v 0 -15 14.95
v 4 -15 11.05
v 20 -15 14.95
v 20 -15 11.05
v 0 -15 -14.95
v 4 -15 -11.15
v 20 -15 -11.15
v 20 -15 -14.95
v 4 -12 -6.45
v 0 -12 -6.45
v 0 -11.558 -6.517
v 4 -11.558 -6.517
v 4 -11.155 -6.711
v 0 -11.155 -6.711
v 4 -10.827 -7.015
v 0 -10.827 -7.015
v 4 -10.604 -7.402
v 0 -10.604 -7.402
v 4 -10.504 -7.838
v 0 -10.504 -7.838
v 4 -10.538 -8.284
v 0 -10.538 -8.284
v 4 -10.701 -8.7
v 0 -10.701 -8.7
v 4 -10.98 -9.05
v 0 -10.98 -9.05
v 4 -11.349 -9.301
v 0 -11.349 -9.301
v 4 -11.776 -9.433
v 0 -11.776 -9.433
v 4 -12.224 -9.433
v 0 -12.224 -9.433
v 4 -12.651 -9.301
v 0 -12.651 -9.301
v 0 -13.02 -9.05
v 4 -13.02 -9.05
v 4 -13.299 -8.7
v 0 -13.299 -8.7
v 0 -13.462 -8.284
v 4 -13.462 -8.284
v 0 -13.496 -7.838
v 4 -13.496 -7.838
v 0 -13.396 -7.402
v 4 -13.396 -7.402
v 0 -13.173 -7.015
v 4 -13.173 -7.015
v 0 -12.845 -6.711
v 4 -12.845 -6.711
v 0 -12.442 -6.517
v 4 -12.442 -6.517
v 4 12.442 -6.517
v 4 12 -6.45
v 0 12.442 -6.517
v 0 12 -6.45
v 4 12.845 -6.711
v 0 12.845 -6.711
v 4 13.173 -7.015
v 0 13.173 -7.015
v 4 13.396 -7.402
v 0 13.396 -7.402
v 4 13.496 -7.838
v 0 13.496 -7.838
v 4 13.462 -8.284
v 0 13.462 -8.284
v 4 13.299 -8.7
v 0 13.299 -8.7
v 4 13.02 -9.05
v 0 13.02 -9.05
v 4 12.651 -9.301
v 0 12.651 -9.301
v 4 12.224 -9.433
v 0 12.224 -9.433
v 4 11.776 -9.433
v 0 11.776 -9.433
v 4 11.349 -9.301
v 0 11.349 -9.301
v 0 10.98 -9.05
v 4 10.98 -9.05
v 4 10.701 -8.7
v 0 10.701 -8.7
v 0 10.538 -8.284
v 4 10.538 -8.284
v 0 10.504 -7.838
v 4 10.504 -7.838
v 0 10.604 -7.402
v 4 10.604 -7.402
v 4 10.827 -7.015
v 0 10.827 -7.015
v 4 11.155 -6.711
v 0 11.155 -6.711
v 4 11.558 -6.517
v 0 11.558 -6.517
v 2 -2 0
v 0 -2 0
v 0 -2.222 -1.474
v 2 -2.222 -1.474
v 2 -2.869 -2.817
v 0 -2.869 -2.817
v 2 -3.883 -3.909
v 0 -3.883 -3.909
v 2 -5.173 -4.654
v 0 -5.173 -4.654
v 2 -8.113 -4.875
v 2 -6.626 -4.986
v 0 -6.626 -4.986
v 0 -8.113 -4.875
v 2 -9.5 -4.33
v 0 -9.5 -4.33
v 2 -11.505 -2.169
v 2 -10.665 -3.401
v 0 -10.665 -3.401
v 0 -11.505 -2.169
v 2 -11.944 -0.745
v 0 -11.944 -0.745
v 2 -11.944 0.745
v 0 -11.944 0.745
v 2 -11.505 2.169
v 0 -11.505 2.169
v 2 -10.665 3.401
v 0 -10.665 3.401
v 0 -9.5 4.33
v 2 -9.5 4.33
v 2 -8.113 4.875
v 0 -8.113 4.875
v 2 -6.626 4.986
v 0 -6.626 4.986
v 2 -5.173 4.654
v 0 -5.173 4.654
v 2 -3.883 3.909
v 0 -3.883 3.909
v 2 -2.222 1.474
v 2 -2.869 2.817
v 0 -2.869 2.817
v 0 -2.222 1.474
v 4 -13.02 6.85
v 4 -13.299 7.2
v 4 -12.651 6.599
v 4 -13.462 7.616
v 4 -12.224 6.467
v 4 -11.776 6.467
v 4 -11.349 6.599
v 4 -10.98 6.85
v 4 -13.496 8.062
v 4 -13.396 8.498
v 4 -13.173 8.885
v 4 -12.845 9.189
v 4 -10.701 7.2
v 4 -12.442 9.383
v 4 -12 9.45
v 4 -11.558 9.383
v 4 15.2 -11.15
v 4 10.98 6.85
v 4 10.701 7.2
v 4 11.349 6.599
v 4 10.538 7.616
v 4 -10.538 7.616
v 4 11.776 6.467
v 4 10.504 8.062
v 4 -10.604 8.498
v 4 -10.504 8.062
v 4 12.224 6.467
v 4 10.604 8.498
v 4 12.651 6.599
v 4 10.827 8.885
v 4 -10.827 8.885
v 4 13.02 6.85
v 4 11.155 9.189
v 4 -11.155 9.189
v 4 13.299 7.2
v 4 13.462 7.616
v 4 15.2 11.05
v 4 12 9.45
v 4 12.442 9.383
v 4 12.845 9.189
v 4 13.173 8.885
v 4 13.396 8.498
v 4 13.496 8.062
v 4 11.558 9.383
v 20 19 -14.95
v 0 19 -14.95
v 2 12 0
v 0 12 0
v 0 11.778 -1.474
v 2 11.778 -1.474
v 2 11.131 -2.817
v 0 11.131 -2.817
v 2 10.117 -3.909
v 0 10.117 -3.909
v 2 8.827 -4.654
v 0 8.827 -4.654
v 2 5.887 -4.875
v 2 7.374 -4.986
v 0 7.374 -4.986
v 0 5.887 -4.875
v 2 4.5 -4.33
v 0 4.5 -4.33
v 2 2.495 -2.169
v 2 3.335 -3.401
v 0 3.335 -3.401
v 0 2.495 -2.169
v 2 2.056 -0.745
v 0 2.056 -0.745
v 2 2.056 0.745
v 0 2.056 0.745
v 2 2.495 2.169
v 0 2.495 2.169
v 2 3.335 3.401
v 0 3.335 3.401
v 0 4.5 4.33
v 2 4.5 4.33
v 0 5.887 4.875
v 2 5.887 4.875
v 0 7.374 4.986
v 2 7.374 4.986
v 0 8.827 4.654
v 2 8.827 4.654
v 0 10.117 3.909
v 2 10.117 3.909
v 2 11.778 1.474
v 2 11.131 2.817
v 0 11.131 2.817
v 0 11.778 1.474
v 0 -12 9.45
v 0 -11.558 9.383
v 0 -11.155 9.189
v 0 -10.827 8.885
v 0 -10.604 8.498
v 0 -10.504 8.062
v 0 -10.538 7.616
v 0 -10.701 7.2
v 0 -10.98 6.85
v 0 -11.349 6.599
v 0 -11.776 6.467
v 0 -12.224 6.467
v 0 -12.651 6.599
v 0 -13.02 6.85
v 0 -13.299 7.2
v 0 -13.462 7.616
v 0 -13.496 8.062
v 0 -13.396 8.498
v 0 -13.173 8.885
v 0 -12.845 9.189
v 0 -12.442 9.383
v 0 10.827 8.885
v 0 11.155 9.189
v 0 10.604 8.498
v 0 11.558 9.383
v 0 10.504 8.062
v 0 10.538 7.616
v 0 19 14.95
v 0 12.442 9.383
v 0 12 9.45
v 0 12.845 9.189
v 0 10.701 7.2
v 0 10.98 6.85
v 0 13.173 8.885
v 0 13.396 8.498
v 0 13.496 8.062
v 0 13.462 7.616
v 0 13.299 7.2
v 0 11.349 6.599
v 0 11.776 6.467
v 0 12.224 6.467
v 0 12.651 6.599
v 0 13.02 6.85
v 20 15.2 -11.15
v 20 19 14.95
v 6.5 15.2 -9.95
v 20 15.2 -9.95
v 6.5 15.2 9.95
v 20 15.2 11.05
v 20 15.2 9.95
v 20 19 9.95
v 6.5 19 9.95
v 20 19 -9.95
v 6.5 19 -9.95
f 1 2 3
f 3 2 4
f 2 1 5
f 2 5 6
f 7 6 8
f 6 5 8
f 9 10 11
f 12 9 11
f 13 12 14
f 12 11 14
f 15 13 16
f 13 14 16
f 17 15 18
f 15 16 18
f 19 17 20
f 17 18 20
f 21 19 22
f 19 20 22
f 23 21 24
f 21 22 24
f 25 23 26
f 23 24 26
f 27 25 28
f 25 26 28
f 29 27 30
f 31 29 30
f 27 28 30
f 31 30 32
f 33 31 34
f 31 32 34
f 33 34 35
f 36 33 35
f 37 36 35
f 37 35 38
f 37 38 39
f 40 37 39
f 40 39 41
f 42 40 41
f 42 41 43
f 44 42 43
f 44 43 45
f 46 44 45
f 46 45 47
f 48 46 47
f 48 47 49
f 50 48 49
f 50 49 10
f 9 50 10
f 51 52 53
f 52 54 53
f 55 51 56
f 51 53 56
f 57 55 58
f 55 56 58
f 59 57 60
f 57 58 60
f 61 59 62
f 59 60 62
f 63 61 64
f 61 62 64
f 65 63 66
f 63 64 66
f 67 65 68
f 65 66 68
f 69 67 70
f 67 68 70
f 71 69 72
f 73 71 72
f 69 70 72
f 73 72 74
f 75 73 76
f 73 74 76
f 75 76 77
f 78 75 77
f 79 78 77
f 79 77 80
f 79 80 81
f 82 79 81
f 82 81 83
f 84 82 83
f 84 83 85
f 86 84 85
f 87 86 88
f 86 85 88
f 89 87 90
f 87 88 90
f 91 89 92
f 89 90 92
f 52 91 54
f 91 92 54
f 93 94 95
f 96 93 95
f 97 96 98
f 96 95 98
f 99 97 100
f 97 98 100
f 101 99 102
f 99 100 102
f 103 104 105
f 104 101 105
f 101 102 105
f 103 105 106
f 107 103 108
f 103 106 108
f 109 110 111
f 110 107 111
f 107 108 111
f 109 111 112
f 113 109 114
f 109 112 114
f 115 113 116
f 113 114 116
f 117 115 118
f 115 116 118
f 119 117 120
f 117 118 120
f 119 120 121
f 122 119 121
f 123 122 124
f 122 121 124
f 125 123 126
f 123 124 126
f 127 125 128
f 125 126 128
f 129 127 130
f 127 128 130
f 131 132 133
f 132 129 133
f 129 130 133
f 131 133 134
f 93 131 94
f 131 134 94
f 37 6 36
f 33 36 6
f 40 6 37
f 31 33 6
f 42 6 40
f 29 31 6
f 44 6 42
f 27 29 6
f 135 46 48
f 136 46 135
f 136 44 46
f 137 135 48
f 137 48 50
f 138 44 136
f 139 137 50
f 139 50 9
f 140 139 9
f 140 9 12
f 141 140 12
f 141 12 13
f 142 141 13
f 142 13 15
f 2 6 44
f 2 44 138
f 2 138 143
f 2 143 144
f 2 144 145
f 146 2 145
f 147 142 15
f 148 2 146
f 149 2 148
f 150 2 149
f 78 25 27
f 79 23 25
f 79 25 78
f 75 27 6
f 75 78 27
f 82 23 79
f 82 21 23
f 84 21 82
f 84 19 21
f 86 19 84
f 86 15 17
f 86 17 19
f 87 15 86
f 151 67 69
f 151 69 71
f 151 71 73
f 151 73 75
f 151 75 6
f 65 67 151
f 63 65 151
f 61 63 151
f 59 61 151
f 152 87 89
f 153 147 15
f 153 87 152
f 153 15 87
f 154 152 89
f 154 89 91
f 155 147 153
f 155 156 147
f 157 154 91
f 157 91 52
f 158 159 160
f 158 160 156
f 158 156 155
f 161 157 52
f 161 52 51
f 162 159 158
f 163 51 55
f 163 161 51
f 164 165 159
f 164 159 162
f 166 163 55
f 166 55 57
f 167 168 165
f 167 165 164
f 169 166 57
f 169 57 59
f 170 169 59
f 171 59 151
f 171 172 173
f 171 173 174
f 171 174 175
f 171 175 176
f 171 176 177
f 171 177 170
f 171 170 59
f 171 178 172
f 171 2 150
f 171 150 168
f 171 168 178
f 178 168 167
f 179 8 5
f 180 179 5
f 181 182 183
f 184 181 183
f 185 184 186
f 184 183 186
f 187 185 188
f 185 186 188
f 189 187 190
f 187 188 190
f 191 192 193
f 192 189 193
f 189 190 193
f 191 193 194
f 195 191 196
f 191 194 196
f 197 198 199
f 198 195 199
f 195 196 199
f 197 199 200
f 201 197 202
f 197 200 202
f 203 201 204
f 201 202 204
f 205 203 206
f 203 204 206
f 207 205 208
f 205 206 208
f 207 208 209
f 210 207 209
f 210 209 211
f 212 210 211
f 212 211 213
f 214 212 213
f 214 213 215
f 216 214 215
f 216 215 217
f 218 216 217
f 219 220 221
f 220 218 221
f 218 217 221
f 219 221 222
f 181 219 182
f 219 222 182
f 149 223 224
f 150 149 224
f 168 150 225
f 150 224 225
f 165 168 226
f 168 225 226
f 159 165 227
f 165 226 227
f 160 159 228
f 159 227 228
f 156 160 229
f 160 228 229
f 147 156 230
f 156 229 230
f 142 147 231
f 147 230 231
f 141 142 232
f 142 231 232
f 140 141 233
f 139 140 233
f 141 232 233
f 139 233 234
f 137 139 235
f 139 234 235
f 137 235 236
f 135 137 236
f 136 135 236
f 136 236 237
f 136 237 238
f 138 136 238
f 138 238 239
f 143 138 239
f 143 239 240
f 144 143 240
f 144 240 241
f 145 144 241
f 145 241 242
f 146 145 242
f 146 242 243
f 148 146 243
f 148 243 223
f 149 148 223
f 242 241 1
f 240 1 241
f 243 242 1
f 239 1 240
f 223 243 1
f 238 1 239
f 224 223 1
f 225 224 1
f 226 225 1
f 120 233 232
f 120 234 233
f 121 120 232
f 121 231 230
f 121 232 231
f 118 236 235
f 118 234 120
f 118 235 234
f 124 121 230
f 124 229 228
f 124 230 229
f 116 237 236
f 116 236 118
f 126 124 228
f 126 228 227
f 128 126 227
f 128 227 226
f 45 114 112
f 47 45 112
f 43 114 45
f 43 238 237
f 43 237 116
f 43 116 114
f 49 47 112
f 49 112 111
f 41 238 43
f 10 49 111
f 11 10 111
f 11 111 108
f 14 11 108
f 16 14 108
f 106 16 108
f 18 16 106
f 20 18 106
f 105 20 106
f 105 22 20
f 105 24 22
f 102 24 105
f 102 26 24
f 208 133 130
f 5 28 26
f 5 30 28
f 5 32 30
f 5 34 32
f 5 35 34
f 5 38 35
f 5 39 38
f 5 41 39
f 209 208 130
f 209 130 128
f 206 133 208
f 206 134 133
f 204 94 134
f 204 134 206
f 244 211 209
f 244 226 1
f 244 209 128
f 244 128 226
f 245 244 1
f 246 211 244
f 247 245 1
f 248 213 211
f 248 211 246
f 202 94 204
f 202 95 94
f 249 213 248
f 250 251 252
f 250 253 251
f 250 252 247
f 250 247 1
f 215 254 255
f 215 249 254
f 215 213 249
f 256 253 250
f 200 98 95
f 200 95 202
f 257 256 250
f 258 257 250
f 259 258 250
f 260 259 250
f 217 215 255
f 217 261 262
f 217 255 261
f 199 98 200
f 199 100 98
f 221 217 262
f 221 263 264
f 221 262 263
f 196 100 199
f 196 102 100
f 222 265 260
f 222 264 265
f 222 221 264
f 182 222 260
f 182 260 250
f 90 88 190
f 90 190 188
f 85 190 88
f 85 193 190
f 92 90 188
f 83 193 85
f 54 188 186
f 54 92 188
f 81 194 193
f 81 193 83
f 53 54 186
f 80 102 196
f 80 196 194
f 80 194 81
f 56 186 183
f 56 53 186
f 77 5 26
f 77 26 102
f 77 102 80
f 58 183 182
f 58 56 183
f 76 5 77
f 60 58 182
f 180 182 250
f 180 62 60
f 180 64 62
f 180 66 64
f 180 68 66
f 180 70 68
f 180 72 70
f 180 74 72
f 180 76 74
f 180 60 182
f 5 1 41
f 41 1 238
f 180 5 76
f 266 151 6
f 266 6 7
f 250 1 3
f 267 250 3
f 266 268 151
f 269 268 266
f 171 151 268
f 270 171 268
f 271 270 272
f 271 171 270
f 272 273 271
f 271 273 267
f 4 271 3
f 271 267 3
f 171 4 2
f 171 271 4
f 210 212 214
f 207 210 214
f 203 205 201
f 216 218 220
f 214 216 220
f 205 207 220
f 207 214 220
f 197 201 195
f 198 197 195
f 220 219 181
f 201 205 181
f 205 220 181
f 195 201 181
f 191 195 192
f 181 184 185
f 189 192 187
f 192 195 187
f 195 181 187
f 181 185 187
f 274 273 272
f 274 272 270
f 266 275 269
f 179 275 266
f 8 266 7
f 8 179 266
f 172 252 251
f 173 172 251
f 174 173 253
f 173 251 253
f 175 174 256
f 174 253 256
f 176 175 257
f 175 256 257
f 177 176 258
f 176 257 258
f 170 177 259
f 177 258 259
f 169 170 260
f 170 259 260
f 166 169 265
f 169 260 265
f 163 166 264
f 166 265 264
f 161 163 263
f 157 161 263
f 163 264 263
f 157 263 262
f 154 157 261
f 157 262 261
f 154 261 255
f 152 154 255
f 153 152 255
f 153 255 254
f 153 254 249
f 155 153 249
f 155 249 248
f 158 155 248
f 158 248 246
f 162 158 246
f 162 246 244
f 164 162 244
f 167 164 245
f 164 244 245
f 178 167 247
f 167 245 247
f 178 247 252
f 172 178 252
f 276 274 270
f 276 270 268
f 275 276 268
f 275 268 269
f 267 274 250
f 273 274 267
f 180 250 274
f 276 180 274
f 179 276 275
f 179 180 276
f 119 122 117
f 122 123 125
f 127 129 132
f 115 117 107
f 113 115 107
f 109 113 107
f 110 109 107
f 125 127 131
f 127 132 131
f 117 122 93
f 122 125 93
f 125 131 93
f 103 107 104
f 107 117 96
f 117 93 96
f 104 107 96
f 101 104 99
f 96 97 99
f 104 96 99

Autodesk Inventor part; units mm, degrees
ref_plane "YZ Plane" through (0, 0, 0) normal (1, 0, 0) x (0, 1, 0)
ref_plane "XZ Plane" through (0, 0, 0) normal (0, 1, 0) x (-1, 0, 0)
sketch "Эскиз1" plane through (0, 0, 0) normal (1, 0, 0) x (0, 1, 0)
  line L0 (-15, -10.95) -> (15, -10.95)
  line L1 (15, -10.95) -> (15, 10.95)
  line L2 (15, 10.95) -> (-15, 10.95)
  line L3 (-15, 10.95) -> (-15, -10.95)
  line L4 (-15, -10.95) -> (15, 10.95) construction
  line L5 (15, -10.95) -> (-15, 10.95) construction
  circle A0 centre (7, 0) radius 5
  circle A1 centre (-7, 0) radius 5
  point P0 (0, 0)
  dimension "d0" = 30
  dimension "d1" = 21.9
  dimension "d2" = 10
  dimension "d3" = 10
  dimension "d4" = 8
  dimension "d5" = 14
  dimension "d6" = 8
  dimension "d7" = 0
extrude "Выдавливание1" add sketch "Эскиз1" along normal blind 2
sketch "Эскиз2" plane through (2, 0, 0) normal (1, 0, 0) x (0, 0, -1)
  line L0 (10.95, 15) -> (-10.95, 15) projected
  line L1 (10.95, -15) -> (-10.95, -15)
  line L2 (-10.95, -15) -> (-10.95, 15)
  line L3 (-10.95, 15) -> (10.95, 15)
  line L4 (10.95, 15) -> (10.95, -15)
  line L5 (10.95, -15) -> (-10.95, 15) construction
  line L6 (-10.95, -15) -> (10.95, 15) construction
  point P0 (0, 0)
extrude "Выдавливание2" add sketch "Эскиз2" along normal blind 2
sketch "Эскиз3" plane through (0, 0, 0) normal (-1, 0, 0) x (0, 0, 1)
  circle A0 centre (-7.95, 12) radius 1.5
  line L0 (-10.95, 15) -> (10.95, 15) projected
  line L1 (-10.95, -15) -> (-10.95, 15) projected
  circle A1 centre (-7.95, -12) radius 1.5
  line L2 (10.95, -15) -> (-10.95, -15) projected
  circle A2 centre (7.95, 12) radius 1.5
  line L3 (10.95, 15) -> (10.95, -15) projected
  circle A3 centre (7.95, -12) radius 1.5
  point P0 (0, 0)
  dimension "d12" = 3
  dimension "d13" = 3
  dimension "d14" = 3
  dimension "d15" = 3
  dimension "d16" = 3
  dimension "d17" = 3
  dimension "d18" = 3
  dimension "d19" = 3
  dimension "d20" = 3
extrude "Выдавливание3" cut sketch "Эскиз3" against normal up to surface (4 mm away) contours A0 | A1 | A2 | A3
ref_plane "РабПлоскость1" through (0, 10, -4) normal (1, 0, 0) x (0, 0, -1)
sketch "Эскиз4" plane through (0, 10, -4) normal (1, 0, 0) x (0, 0, -1)
  line L0 (6.95, 5) -> (-14.95, 5) projected
  line L1 (-14.95, 5) -> (6.95, 5)
  line L2 (6.95, 5) -> (6.95, 9)
  line L3 (6.95, 9) -> (-14.95, 9)
  line L4 (-14.95, 9) -> (-14.95, 5)
  point P0 (-4, -10)
  dimension "d23" = 4
extrude "Выдавливание4" add sketch "Эскиз4" along normal blind 6.5
sketch "Эскиз5" plane through (4, -15, -10.95) normal (0, 0, -1) x (-1, 0, 0)
  line L0 (4, 34) -> (4, 0) projected
  line L1 (4, 34) -> (-16, 34)
  line L2 (-16, 34) -> (-16, 0)
  line L3 (-16, 0) -> (4, 0)
  line L4 (4, 0) -> (4, 34)
  point P0 (4, 15)
  dimension "d26" = 20
extrude "Выдавливание5" add sketch "Эскиз5" along normal blind 4
sketch "Эскиз6" plane through (0, -15, 10.95) normal (0, 0, 1) x (1, 0, 0)
  line L0 (0, 0) -> (0, 34) projected
  line L1 (20, 34) -> (20, 0) projected
  line L2 (0, 0) -> (20, 0)
  line L3 (20, 0) -> (20, 34)
  line L4 (20, 34) -> (0, 34)
  line L5 (0, 34) -> (0, 0)
  point P0 (0, 15)
  point P1 (20, 0)
  point P2 (0, 34)
extrude "Выдавливание6" add sketch "Эскиз6" along normal blind 4
sketch "Эскиз7" plane through (0, -15, 10.95) normal (0, 0, -1) x (-1, 0, 0)
  line L0 (-20, 0) -> (-20, 34) projected
  line L1 (-20, 0) -> (-4, 0)
  line L2 (-4, 0) -> (-4, 30)
  line L3 (-4, 30) -> (-20, 30)
  line L4 (-20, 30) -> (-20, 0)
  point P0 (0, 15)
extrude "Выдавливание7" cut sketch "Эскиз7" along normal mid plane 0.2
sketch "Эскиз8" plane through (4, -15, -10.95) normal (0, 0, 1) x (1, 0, 0)
  line L0 (16, 34) -> (16, 0) projected
  line L1 (0, 0) -> (0, 30) projected
  line L2 (16, 0) -> (0, 0)
  line L3 (0, 0) -> (0, 30)
  line L4 (0, 30) -> (16, 30)
  line L5 (16, 30) -> (16, 0)
  point P0 (-4, 15)
extrude "Выдавливание8" cut sketch "Эскиз8" against normal blind 0.2
sketch "Эскиз9" plane through (0, -15, 10.95) normal (0, 0, -1) x (-1, 0, 0)
  line L0 (-20, 30) -> (-6.5, 30) projected
  line L1 (-6.5, 34) -> (-20, 34)
  line L2 (-20, 34) -> (-20, 30)
  line L3 (-20, 30) -> (-6.5, 30)
  line L4 (-6.5, 30) -> (-6.5, 34)
  point P0 (0, 15)
extrude "Выдавливание9" add sketch "Эскиз9" along normal blind 1
sketch "Эскиз10" plane through (4, -15, -10.95) normal (0, 0, 1) x (1, 0, 0)
  line L0 (2.5, 30) -> (2.5, 34) projected
  line L1 (2.5, 30) -> (16, 30) projected
  line L2 (2.5, 34) -> (16, 34)
  line L3 (16, 34) -> (16, 30)
  line L4 (16, 30) -> (2.5, 30)
  line L5 (2.5, 30) -> (2.5, 34)
  point P0 (-4, 15)
extrude "Выдавливание10" add sketch "Эскиз10" along normal blind 1
sketch "Эскиз11" plane through (4, 15, 11.05) normal (0, -1, 0) x (1, 0, 0)
  line L0 (0, -22.2) -> (0, 0) projected
  line L1 (0, -22.2) -> (16, -22.2) projected
  line L2 (16, -22.2) -> (16, -21) projected
  line L3 (2.5, -21) -> (16, -21) projected
  line L4 (2.5, -1.1) -> (2.5, -21) projected
  line L5 (16, -1.1) -> (2.5, -1.1) projected
  line L6 (16, 0) -> (16, -1.1) projected
  line L7 (16, 0) -> (0, 0) projected
  point P0 (-4, -11.05)
extrude "Выдавливание11" cut sketch "Эскиз11" against normal blind 0.2
properties part number "держатель магнитов на основе"
